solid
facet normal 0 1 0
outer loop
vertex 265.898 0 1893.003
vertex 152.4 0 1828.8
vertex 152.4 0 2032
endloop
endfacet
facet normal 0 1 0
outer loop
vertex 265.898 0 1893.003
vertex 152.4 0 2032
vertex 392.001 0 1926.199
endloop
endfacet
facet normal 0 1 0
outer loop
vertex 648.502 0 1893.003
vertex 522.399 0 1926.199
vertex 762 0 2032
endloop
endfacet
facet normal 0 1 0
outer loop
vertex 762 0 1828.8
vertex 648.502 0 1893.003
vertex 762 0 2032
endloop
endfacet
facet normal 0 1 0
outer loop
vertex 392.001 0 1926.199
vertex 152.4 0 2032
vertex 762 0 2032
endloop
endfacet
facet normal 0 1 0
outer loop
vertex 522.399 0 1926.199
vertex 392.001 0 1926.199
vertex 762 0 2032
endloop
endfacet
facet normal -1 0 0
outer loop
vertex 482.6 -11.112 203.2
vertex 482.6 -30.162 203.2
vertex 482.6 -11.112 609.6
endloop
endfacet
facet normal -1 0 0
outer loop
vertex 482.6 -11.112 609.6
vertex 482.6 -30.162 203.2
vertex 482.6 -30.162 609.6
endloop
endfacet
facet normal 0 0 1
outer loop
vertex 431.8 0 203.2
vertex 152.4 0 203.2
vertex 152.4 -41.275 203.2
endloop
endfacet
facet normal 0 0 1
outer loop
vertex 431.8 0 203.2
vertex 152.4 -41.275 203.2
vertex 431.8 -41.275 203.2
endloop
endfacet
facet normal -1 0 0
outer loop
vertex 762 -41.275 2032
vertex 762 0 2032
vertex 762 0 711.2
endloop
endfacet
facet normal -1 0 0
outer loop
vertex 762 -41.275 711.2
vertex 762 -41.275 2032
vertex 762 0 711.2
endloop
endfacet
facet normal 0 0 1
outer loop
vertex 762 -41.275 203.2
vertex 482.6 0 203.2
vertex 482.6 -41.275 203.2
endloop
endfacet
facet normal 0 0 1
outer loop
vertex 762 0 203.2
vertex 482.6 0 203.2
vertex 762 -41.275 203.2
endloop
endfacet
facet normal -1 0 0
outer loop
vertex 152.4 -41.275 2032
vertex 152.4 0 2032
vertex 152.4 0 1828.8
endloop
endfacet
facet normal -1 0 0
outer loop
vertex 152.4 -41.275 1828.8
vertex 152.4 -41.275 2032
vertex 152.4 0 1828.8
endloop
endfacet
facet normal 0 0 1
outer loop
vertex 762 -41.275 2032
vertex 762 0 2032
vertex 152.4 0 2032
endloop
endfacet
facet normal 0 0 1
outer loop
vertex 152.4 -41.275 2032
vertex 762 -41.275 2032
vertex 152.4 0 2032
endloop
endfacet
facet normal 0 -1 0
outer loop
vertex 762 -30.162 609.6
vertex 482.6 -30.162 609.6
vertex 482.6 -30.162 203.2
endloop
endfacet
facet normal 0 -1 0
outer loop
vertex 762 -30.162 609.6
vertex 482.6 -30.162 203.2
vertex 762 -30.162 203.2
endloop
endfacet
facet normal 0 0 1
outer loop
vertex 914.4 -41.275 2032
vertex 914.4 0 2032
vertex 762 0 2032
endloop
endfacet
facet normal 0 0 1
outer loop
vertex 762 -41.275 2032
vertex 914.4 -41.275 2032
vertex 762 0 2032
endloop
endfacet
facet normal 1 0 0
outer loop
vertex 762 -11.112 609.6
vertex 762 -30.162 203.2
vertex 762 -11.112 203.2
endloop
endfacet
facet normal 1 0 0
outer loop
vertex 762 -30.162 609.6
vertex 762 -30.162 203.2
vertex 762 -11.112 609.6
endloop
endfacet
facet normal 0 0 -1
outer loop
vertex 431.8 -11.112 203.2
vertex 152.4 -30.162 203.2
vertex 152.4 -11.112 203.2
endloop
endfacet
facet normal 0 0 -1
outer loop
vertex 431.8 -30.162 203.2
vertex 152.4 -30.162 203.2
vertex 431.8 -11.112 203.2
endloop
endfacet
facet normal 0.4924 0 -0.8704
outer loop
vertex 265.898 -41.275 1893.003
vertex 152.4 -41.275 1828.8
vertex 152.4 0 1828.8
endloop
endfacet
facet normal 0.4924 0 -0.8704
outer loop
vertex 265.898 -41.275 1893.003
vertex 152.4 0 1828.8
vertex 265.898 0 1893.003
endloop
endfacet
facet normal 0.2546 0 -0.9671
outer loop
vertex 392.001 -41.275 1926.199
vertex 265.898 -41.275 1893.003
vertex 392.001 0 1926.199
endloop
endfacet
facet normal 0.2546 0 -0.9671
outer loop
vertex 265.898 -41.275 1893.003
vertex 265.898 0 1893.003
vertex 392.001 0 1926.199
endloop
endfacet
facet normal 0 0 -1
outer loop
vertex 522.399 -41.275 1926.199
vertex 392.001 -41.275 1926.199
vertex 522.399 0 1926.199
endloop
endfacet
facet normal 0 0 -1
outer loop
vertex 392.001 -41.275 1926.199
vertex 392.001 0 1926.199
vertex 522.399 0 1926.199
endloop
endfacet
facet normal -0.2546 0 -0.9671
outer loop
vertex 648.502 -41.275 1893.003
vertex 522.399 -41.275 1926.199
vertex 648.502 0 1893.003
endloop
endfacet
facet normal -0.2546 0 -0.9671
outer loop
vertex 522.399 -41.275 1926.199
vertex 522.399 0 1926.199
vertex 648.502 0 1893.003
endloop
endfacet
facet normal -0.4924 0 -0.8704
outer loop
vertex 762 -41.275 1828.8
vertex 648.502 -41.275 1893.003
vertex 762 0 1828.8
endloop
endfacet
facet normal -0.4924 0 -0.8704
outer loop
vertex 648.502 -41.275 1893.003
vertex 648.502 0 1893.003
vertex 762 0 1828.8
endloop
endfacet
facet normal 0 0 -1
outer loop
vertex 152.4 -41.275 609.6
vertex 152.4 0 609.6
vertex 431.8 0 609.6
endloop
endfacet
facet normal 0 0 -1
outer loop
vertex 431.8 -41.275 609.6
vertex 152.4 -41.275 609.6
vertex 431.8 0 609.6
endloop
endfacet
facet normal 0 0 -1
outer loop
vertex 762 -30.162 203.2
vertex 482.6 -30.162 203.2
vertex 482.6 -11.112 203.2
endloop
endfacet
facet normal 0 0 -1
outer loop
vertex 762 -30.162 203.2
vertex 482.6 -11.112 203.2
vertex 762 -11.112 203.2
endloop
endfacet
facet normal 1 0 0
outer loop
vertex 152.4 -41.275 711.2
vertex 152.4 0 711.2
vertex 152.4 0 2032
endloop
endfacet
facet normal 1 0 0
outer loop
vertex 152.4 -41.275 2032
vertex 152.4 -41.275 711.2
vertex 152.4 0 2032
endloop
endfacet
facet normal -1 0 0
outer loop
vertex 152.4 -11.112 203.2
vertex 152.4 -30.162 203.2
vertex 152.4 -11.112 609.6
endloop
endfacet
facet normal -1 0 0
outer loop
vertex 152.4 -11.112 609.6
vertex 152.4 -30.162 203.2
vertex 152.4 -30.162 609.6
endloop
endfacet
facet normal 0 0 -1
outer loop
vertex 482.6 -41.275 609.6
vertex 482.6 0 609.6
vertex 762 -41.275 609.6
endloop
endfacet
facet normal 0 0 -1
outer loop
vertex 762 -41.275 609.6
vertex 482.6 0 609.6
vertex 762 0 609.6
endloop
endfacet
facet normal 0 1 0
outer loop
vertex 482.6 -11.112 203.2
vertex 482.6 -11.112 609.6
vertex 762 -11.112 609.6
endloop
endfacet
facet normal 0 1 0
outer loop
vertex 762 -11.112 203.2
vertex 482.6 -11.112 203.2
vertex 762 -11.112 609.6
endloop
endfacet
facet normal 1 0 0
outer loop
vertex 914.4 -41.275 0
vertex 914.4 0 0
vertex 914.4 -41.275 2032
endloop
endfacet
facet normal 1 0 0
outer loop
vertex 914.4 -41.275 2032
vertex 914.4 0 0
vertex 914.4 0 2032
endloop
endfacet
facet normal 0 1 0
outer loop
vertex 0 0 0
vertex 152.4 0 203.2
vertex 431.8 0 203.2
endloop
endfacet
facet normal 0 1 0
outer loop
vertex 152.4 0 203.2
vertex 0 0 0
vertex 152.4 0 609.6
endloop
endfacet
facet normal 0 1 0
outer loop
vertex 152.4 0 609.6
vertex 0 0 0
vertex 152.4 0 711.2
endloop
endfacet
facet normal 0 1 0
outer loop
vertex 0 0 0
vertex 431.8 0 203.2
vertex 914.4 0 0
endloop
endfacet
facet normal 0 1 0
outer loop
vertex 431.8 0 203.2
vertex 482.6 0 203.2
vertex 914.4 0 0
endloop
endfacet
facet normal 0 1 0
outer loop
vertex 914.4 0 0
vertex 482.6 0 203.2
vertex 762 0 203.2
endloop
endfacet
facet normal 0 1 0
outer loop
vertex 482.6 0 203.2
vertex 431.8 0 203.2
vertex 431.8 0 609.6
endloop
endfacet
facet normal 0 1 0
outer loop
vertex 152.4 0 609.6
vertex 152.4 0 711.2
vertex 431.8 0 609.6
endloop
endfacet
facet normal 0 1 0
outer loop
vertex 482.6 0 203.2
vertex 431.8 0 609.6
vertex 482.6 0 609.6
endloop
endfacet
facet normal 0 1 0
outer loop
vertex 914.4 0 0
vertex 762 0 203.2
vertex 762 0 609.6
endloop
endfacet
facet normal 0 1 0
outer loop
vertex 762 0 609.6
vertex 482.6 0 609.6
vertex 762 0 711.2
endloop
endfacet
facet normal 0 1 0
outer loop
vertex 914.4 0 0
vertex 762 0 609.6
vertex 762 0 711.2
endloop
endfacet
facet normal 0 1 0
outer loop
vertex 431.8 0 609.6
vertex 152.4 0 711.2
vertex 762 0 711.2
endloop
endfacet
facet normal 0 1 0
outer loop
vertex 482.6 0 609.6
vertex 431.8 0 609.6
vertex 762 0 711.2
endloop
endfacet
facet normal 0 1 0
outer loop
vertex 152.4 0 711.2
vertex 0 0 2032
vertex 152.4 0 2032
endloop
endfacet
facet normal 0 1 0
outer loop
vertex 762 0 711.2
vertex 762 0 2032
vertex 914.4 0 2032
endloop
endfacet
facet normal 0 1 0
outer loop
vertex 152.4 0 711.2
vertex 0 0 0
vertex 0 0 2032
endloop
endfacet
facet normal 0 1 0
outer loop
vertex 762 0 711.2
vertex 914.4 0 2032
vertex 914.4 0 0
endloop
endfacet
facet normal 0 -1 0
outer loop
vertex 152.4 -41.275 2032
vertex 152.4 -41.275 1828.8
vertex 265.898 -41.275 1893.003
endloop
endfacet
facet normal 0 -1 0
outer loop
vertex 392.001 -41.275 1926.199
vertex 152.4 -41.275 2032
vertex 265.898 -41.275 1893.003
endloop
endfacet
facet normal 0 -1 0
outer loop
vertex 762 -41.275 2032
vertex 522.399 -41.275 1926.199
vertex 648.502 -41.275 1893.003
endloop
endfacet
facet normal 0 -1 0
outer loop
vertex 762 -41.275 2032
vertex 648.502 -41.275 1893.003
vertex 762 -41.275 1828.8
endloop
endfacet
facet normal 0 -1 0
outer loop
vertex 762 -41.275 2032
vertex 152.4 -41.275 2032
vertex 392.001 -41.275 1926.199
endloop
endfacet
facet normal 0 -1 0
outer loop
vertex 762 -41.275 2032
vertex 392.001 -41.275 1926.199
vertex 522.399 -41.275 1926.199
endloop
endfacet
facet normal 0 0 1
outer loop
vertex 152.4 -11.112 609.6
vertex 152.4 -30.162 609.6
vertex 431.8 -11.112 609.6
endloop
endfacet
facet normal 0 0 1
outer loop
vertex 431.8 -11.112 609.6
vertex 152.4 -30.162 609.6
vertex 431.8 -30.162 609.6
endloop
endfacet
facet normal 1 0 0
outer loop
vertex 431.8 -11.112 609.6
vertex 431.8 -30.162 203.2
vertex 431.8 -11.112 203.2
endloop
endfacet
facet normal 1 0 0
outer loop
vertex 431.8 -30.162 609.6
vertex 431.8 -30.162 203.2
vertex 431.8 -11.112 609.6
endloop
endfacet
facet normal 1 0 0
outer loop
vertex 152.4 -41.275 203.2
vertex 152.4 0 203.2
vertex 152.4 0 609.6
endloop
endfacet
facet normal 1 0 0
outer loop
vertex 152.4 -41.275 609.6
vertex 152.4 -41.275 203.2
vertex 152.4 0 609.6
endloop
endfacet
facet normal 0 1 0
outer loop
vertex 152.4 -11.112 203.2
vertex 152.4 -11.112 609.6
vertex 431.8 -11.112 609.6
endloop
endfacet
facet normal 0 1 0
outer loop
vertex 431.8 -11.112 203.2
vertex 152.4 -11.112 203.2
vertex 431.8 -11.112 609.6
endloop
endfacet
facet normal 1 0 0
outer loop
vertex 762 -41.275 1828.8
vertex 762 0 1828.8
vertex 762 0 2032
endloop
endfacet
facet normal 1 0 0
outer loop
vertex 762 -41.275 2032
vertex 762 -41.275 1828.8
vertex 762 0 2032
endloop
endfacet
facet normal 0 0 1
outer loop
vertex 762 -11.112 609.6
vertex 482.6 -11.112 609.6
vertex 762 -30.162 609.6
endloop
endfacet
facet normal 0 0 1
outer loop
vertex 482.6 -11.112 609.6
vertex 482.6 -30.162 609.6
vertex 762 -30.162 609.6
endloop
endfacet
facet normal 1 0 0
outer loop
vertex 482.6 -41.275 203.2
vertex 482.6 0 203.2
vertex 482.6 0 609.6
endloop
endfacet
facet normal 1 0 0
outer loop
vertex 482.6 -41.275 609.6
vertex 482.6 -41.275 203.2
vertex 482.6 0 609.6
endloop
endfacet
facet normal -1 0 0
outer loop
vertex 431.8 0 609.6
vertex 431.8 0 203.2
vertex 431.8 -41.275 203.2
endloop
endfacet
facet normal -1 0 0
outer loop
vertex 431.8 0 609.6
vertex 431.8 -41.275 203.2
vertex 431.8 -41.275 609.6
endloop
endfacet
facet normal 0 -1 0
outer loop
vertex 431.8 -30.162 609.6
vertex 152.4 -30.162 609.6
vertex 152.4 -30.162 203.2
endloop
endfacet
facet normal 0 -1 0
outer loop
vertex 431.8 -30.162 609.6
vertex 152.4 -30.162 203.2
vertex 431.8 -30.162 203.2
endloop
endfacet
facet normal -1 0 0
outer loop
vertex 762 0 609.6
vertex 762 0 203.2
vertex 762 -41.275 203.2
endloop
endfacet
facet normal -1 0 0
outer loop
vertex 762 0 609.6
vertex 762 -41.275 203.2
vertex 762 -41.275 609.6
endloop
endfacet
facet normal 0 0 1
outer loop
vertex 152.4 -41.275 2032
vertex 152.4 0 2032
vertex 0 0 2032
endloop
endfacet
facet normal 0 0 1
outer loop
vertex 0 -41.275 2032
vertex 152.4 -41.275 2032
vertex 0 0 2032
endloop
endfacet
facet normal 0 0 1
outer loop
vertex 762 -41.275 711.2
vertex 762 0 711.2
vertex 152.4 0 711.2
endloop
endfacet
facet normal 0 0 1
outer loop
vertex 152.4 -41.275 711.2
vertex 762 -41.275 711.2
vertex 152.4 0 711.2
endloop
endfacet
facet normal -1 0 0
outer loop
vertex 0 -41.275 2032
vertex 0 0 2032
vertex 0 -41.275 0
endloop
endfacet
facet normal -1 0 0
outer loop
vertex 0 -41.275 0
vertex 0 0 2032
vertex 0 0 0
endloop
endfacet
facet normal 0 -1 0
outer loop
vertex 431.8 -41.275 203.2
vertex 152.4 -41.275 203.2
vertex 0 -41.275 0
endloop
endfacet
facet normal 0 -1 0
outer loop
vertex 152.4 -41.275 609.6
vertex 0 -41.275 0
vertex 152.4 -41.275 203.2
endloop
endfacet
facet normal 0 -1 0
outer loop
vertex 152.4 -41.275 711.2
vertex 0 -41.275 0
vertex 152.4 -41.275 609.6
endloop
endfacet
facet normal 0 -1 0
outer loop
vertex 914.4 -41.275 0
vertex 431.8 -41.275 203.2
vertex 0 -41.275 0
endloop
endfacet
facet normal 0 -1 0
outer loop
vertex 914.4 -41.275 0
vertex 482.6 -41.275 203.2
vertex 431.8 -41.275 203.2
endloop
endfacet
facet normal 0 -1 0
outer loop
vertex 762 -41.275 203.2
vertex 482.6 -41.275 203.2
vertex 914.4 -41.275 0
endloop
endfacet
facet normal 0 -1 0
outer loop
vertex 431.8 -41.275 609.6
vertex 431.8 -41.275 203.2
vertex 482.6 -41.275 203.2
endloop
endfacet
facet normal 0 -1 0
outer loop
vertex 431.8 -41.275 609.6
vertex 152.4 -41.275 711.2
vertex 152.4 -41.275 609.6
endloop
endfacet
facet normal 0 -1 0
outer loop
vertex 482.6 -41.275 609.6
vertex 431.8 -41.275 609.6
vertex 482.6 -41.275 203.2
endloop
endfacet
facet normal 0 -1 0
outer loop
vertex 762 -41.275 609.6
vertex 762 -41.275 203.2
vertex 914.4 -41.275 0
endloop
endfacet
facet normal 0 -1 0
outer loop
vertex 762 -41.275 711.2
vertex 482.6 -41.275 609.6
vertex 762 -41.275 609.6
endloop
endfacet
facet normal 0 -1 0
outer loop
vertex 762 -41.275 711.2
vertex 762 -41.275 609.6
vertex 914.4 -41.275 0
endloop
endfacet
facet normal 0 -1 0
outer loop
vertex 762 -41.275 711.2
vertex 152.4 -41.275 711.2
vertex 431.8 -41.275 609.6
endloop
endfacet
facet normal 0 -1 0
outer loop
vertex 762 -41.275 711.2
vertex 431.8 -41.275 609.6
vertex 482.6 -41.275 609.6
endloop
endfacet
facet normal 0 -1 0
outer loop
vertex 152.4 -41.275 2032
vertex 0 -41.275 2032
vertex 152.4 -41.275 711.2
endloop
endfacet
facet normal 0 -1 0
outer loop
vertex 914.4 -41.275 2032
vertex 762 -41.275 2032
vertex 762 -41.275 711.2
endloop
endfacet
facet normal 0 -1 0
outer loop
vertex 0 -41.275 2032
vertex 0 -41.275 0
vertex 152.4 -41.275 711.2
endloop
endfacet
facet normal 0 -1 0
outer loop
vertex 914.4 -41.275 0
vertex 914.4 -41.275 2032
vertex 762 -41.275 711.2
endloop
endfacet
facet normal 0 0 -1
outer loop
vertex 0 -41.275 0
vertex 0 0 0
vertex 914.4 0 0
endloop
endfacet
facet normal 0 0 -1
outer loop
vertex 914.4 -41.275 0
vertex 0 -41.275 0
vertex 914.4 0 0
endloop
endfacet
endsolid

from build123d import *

# Parameters (mm, degrees)
F1_DEPTH = 41.275
F4_DEPTH = 41.275
F5_W     = 279.4
F5_H     = 406.4
F6_DEPTH = 41.276
F7_W     = 279.4
F7_H     = 406.4
F8_DEPTH = 9.525


# Not quite as in the source:
# - a length typed as a fraction of an inch, garbled in the dataset ("3 / 203.2 mm" for 3/8 in), is restored


with BuildPart() as f1:
    # F0 (on Front) → F1 (new body)
    with BuildSketch(Plane.XZ):
        Polygon((0, 2032), (0, 0), (914.4, 0), (914.4, 2032), (762, 2032), (762, 711.2), (152.4, 711.2), (152.4, 2032), align=None)
    extrude(amount=F1_DEPTH)

    # F5 (on Front) → F6 (cut, through all)
    with BuildSketch(Plane.XZ):
        with Locations((622.3, 406.4)):
            Rectangle(F5_W, F5_H)
        with Locations((292.1, 406.4)):
            Rectangle(F5_W, F5_H)
    extrude(amount=F6_DEPTH, mode=Mode.SUBTRACT)


with BuildPart() as f4:
    # F3 (on Front) → F4 (new body, through all)
    with BuildSketch(Plane.XZ):
        with BuildLine():
            Line((762, 2032), (152.4, 2032))
            Line((152.4, 2032), (152.4, 1828.8))
            ThreePointArc((152.4, 1828.8), (457.2, 1930.4), (762, 1828.8))
            Line((762, 1828.8), (762, 2032))
        make_face()
    extrude(amount=F4_DEPTH)


with BuildPart() as f8:
    # F7 (on offset) → F8 (new body, symmetric)
    with BuildSketch(Plane.XZ.offset(20.6375)):
        with Locations((292.1, 406.4)):
            Rectangle(F7_W, F7_H)
    extrude(amount=F8_DEPTH, both=True)


with BuildPart() as f8b:
    # F7 (on offset) → F8, piece 2 (new body, symmetric)
    with BuildSketch(Plane.XZ.offset(20.6375)):
        with Locations((622.3, 406.4)):
            Rectangle(F7_W, F7_H)
    extrude(amount=F8_DEPTH, both=True)


solid = Compound([f1.part, f4.part, f8.part, f8b.part])
